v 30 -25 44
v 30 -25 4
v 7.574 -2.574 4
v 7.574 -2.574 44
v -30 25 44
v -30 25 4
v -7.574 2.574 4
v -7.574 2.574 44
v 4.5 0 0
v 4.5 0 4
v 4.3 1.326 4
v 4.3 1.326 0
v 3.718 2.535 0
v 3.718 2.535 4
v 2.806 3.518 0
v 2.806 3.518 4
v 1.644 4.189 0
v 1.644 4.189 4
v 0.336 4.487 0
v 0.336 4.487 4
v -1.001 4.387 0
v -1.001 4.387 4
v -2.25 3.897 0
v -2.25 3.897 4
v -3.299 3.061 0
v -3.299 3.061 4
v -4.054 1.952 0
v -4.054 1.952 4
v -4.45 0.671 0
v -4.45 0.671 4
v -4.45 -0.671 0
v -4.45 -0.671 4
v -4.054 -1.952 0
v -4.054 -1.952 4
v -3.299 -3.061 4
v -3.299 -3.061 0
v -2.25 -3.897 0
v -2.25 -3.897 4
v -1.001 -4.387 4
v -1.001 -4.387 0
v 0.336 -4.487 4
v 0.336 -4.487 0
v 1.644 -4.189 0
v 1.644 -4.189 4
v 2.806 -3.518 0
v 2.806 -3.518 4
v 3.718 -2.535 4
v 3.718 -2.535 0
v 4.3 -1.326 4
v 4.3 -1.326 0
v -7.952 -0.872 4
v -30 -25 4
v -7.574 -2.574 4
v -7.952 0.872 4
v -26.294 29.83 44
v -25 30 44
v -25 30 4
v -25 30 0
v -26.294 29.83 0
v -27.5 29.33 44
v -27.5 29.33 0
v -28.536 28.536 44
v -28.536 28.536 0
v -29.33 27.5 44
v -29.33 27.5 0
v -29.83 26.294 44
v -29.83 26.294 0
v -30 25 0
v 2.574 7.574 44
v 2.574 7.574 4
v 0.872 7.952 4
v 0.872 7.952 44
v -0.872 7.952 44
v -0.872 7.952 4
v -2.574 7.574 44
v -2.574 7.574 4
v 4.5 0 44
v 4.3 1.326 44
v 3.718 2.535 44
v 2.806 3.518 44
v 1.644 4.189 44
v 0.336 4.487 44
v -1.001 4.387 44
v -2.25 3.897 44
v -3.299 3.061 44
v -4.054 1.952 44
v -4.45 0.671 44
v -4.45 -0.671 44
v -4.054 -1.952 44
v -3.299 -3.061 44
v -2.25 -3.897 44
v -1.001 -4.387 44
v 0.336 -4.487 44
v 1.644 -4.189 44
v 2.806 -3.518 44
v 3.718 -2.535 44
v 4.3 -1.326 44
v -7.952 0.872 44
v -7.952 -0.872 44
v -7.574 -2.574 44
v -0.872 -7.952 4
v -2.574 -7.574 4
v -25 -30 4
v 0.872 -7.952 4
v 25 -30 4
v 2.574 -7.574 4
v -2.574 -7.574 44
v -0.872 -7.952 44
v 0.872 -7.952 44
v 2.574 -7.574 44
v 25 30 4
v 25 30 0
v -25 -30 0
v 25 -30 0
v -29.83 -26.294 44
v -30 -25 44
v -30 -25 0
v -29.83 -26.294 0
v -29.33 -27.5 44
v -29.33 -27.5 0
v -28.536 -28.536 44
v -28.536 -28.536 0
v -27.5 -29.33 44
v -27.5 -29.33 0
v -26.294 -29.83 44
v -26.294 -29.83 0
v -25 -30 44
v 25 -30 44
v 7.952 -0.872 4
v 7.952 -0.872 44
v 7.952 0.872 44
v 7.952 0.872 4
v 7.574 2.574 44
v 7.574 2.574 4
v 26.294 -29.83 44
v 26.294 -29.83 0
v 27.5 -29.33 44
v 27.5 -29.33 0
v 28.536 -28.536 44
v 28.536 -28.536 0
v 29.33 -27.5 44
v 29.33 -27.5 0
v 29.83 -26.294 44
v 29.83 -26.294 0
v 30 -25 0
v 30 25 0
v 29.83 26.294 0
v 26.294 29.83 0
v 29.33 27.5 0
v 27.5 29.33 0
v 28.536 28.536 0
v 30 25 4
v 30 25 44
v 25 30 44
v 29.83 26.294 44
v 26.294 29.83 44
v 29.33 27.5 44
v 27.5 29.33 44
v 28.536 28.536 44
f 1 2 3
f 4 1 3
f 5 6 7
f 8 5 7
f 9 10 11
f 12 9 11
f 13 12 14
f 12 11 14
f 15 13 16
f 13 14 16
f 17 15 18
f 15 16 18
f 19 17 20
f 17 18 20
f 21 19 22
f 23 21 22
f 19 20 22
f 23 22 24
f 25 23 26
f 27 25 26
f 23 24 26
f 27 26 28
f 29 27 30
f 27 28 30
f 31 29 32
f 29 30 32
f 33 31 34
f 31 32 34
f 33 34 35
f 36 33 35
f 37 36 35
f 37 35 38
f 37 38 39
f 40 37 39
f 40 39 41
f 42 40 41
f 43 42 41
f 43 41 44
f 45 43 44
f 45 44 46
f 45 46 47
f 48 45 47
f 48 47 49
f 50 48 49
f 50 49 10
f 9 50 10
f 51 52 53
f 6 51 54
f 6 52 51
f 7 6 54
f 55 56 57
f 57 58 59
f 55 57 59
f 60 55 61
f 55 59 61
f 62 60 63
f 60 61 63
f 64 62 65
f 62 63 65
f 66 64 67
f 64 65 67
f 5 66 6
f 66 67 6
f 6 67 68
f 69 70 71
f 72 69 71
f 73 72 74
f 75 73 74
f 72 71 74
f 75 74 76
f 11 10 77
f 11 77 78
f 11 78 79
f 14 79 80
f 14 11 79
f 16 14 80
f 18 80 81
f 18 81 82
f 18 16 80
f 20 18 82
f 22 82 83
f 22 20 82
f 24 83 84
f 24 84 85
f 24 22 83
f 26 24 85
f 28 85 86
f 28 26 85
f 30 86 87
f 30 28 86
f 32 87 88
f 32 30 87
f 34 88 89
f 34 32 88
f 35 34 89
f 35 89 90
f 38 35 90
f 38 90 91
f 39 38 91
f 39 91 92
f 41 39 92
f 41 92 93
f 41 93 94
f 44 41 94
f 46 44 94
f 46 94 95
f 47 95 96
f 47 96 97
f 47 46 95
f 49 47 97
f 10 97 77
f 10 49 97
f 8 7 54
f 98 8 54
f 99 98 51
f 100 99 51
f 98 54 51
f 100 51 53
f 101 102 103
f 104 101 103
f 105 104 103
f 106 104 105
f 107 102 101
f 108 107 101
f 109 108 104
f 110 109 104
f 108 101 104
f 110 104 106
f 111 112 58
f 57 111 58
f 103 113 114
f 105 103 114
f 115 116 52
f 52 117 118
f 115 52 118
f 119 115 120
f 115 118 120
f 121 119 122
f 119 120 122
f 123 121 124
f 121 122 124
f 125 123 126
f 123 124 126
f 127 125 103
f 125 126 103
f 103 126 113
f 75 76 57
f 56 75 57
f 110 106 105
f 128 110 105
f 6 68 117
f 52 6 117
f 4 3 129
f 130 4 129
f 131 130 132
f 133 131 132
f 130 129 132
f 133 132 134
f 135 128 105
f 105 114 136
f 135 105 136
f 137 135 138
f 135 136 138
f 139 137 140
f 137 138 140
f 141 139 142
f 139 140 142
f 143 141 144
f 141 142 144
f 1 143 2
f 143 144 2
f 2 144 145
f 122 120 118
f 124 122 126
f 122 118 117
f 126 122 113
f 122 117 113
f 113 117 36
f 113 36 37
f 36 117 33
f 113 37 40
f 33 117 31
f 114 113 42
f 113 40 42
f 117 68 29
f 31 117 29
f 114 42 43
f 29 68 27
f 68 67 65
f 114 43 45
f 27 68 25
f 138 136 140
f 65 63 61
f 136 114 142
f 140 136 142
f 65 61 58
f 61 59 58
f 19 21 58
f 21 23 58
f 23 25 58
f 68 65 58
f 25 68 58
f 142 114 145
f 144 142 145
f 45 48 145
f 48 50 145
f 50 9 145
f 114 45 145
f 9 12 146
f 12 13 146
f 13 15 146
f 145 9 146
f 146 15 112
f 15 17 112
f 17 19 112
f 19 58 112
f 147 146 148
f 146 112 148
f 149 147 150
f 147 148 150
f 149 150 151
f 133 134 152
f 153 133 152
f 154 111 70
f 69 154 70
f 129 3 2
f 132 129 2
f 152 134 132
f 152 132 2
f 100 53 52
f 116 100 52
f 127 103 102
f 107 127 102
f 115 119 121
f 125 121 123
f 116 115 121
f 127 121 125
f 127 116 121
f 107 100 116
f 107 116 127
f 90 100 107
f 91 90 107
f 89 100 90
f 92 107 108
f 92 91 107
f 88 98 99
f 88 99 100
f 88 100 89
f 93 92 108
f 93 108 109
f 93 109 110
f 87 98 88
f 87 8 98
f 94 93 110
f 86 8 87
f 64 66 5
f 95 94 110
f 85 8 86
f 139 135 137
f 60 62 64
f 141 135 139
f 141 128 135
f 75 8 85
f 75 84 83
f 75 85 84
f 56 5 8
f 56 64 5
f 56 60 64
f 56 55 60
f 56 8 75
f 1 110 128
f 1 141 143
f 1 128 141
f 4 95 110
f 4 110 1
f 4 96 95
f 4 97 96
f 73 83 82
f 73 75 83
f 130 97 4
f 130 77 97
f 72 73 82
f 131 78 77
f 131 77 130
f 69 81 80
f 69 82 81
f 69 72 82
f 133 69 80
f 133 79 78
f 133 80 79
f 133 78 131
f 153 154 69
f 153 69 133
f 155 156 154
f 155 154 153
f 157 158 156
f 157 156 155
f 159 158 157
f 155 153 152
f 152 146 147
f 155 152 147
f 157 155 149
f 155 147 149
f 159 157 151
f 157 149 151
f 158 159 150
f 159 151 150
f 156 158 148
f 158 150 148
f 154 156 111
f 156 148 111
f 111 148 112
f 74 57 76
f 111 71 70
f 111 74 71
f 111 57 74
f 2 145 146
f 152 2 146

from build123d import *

# Parameters (mm, degrees)
F1_DEPTH = 4
F2_R     = 4.5
F3_DEPTH = 40
F4_DEPTH = 25


with BuildPart() as f1:
    # F0 (on Top) → F1 (new body)
    with BuildSketch(Plane.XY):
        with BuildLine():
            Line((-25, -30), (25, -30))
            ThreePointArc((25, -30), (28.535534, -28.535534), (30, -25))
            Line((30, -25), (30, 25))
            ThreePointArc((30, 25), (28.535534, 28.535534), (25, 30))
            Line((25, 30), (-25, 30))
            ThreePointArc((-25, 30), (-28.535534, 28.535534), (-30, 25))
            Line((-30, 25), (-30, -25))
            ThreePointArc((-30, -25), (-28.535534, -28.535534), (-25, -30))
        make_face()
    extrude(amount=F1_DEPTH)

    # F2 (on face) → F3 (join)
    with BuildSketch(Plane.XY.offset(4)):
        with BuildLine():
            Line((-30, 25), (-7.574446, 2.574446))
            ThreePointArc((-7.574446, 2.574446), (-8, 0), (-7.574446, -2.574446))
            Line((-7.574446, -2.574446), (-30, -25))
            ThreePointArc((-30, -25), (-28.535534, -28.535534), (-25, -30))
            Line((-25, -30), (-2.574446, -7.574446))
            ThreePointArc((-2.574446, -7.574446), (0, -8), (2.574446, -7.574446))
            Line((2.574446, -7.574446), (25, -30))
            ThreePointArc((25, -30), (28.535534, -28.535534), (30, -25))
            Line((30, -25), (7.574446, -2.574446))
            ThreePointArc((7.574446, -2.574446), (8, 0), (7.574446, 2.574446))
            Line((7.574446, 2.574446), (30, 25))
            ThreePointArc((30, 25), (28.535534, 28.535534), (25, 30))
            Line((25, 30), (2.574446, 7.574446))
            ThreePointArc((2.574446, 7.574446), (0, 8), (-2.574446, 7.574446))
            Line((-2.574446, 7.574446), (-25, 30))
            ThreePointArc((-25, 30), (-28.535534, 28.535534), (-30, 25))
        make_face()
        Circle(F2_R, mode=Mode.SUBTRACT)
    extrude(amount=F3_DEPTH)

    # F2 (on face) → F4 (cut)
    with BuildSketch(Plane.XY.offset(4)):
        Circle(F2_R)
    extrude(amount=-F4_DEPTH, mode=Mode.SUBTRACT)


solid = f1.part
